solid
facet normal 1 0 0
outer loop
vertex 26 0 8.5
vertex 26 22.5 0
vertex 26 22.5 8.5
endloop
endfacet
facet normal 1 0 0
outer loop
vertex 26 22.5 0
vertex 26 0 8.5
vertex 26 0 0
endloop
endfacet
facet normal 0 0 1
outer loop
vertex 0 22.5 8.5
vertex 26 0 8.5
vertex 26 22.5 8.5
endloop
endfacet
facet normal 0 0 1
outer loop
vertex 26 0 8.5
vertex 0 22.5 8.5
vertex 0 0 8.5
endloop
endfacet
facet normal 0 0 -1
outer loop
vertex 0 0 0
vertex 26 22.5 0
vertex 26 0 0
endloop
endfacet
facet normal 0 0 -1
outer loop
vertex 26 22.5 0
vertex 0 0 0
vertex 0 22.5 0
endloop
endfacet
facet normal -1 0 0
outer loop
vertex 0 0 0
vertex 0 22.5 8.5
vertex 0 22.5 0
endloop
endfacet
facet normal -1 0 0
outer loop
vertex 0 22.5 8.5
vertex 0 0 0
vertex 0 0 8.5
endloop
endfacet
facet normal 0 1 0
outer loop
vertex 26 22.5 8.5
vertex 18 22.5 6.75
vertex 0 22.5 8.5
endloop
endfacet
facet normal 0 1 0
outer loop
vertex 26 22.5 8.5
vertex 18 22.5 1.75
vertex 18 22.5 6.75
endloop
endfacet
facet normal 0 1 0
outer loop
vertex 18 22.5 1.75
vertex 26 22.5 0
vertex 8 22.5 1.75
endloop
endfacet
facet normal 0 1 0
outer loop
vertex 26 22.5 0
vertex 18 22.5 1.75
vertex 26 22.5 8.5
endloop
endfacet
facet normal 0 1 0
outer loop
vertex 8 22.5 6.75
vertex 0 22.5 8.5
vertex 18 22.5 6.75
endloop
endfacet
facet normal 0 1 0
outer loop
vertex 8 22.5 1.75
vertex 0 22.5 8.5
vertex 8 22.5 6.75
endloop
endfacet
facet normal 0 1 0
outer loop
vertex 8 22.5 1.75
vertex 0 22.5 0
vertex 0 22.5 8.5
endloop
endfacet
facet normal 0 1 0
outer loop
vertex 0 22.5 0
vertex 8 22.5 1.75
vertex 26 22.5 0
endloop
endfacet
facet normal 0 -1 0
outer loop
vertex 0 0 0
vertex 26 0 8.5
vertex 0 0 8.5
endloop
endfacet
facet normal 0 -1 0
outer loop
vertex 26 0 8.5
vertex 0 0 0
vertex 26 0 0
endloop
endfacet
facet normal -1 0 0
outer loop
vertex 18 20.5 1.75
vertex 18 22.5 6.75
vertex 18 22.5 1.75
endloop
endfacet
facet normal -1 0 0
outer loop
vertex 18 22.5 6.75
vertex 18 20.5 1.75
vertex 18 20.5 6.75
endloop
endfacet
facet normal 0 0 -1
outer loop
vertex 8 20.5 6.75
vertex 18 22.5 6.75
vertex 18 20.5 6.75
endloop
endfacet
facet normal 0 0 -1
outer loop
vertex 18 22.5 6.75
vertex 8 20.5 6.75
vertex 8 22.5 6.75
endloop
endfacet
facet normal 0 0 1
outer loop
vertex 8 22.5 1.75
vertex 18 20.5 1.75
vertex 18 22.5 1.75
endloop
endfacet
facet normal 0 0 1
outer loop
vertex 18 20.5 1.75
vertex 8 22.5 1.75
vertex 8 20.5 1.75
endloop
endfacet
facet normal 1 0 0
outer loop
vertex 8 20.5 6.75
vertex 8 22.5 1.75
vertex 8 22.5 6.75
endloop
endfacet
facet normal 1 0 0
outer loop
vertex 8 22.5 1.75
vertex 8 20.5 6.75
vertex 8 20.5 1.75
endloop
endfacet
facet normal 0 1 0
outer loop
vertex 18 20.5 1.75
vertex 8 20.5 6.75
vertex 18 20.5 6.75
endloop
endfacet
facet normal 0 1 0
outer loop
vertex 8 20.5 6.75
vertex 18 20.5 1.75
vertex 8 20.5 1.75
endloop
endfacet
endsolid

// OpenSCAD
// Base dimensions (adjust as needed)
board_width = 21;
board_length = 17.5;
board_height = 3.5;

// Enclosure dimensions
enclosure_width = board_width + 5;
enclosure_length = board_length + 5;
enclosure_height = board_height + 5;

// Cutout for USB-C
usb_cutout_width = 10;
usb_cutout_height = 5;

module base() {
  translate([0, 0, 0]) cube([enclosure_width, enclosure_length, enclosure_height]);
}

module usb_cutout() {
  translate([enclosure_width/2 - usb_cutout_width/2, enclosure_length - 2, enclosure_height/2 - usb_cutout_height/2]) cube([usb_cutout_width, 3, usb_cutout_height]);
}

difference() {
    base();
    usb_cutout();
}
